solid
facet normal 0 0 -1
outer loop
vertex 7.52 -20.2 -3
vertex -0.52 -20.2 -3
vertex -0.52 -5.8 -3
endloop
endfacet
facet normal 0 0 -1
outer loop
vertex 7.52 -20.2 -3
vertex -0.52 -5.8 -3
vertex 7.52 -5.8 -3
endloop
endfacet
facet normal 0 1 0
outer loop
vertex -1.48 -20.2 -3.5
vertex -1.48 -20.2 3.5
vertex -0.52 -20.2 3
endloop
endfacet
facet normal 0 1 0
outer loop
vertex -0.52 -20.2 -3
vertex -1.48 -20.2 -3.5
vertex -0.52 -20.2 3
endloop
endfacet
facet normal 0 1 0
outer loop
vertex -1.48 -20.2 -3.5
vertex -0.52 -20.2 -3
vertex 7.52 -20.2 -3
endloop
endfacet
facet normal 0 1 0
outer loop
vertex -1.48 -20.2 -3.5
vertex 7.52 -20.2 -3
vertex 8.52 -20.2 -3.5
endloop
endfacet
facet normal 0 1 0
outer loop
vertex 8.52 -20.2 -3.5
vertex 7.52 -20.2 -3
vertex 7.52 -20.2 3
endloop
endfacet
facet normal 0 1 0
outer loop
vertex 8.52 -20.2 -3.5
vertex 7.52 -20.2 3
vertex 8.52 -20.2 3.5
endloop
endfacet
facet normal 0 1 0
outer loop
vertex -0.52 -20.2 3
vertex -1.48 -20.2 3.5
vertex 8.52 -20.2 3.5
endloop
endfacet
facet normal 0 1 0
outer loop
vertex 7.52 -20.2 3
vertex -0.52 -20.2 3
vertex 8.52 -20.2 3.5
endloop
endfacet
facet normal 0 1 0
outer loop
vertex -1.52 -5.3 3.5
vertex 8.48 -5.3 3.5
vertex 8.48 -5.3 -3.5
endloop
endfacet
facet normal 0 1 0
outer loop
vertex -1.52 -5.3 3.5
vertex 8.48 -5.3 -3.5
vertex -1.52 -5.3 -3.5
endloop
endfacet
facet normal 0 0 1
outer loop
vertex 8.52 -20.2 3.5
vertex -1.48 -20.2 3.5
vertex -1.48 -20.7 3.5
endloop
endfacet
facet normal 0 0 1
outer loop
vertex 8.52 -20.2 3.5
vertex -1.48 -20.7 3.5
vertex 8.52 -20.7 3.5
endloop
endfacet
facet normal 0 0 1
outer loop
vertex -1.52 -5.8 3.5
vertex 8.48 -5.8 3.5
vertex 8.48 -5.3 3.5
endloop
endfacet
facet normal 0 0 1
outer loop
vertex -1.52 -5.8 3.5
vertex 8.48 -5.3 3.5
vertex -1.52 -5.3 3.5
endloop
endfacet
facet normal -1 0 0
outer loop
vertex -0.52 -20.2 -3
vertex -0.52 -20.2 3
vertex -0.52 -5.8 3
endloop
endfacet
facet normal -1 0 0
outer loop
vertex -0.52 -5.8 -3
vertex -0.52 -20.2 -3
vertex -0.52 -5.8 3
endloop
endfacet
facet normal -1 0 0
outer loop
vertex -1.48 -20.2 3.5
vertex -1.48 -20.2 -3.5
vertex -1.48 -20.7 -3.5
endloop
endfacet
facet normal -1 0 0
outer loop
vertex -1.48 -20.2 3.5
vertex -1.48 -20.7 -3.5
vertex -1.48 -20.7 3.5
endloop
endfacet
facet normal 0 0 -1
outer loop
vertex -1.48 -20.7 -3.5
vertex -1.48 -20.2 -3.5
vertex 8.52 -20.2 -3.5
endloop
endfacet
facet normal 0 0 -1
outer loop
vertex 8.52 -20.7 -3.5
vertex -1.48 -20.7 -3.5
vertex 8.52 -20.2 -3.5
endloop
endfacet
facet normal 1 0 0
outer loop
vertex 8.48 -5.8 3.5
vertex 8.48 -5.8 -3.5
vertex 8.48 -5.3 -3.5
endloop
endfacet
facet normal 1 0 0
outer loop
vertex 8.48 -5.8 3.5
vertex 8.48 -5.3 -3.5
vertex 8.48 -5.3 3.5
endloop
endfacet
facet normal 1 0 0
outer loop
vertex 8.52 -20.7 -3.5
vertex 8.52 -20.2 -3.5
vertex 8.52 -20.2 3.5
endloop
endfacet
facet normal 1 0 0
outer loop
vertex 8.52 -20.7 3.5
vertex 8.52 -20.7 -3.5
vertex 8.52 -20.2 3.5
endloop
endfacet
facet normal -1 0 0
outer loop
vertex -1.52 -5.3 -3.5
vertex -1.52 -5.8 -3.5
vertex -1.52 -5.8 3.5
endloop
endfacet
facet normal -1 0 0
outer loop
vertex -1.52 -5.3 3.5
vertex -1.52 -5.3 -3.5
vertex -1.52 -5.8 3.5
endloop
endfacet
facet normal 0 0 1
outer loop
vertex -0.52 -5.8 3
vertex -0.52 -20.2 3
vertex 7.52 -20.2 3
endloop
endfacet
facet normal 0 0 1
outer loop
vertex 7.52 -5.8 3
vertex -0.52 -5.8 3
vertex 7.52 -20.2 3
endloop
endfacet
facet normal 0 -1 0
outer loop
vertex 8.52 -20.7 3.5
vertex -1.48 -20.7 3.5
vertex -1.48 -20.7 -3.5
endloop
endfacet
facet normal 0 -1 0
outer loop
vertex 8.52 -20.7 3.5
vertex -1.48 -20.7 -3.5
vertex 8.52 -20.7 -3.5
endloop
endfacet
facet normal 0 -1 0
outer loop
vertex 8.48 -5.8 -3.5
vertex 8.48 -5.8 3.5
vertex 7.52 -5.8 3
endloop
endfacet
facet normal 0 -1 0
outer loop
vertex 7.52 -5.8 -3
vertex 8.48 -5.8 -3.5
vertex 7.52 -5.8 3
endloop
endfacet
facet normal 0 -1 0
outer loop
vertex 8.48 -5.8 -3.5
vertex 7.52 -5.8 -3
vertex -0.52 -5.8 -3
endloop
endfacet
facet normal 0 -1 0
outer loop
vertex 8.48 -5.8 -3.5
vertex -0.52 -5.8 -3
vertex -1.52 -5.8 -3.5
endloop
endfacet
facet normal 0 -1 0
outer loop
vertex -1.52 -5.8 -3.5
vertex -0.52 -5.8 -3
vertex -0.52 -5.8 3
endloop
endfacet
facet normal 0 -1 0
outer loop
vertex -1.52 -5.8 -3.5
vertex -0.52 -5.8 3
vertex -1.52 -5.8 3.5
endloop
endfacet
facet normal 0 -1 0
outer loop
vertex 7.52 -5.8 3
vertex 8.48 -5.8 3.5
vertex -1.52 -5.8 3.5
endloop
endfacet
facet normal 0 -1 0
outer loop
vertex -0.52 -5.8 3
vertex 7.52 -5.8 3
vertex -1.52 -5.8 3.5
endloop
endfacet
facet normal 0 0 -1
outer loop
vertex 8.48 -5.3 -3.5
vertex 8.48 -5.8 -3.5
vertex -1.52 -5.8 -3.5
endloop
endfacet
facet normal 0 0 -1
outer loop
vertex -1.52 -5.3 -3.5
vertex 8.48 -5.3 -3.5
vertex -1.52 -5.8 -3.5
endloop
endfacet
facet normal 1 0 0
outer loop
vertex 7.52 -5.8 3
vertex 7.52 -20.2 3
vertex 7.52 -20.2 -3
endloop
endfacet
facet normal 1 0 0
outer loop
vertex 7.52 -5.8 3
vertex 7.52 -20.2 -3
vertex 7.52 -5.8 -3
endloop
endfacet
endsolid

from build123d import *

# Parameters (mm, degrees)
SKETCH001_W  = 8.04
SKETCH001_H  = 14.4
PAD001_DEPTH = 3
SKETCH002_W  = 10
SKETCH002_H  = 7
PAD002_DEPTH = 0.5
SKETCH003_W  = 10
SKETCH003_H  = 7
PAD003_DEPTH = 0.5


with BuildPart() as part:
    # Sketch001 → Pad001 (new body, symmetric)
    with BuildSketch(Plane.XY):
        Rectangle(SKETCH001_W, SKETCH001_H)
    extrude(amount=PAD001_DEPTH, both=True)

    # Sketch002 (on Face3 of Pad001) → Pad002 (join)
    with BuildSketch(Plane.XZ.offset(7.2)):
        with Locations((0.02, 0)):
            Rectangle(SKETCH002_W, SKETCH002_H)
    extrude(amount=PAD002_DEPTH)

    # Sketch003 (on Face11 of Pad002) → Pad003 (join)
    with BuildSketch(Plane(origin=(0, 7.2, 0), x_dir=(-1, 0, 0), z_dir=(0, 1, 0))):
        with Locations((0.02, 0)):
            Rectangle(SKETCH003_W, SKETCH003_H)
    extrude(amount=PAD003_DEPTH)


with BuildPart() as part_1:
    # Body001 placement: moved
    add(part.part.moved(Location((3.5, -13, 0))))


solid = part_1.part
